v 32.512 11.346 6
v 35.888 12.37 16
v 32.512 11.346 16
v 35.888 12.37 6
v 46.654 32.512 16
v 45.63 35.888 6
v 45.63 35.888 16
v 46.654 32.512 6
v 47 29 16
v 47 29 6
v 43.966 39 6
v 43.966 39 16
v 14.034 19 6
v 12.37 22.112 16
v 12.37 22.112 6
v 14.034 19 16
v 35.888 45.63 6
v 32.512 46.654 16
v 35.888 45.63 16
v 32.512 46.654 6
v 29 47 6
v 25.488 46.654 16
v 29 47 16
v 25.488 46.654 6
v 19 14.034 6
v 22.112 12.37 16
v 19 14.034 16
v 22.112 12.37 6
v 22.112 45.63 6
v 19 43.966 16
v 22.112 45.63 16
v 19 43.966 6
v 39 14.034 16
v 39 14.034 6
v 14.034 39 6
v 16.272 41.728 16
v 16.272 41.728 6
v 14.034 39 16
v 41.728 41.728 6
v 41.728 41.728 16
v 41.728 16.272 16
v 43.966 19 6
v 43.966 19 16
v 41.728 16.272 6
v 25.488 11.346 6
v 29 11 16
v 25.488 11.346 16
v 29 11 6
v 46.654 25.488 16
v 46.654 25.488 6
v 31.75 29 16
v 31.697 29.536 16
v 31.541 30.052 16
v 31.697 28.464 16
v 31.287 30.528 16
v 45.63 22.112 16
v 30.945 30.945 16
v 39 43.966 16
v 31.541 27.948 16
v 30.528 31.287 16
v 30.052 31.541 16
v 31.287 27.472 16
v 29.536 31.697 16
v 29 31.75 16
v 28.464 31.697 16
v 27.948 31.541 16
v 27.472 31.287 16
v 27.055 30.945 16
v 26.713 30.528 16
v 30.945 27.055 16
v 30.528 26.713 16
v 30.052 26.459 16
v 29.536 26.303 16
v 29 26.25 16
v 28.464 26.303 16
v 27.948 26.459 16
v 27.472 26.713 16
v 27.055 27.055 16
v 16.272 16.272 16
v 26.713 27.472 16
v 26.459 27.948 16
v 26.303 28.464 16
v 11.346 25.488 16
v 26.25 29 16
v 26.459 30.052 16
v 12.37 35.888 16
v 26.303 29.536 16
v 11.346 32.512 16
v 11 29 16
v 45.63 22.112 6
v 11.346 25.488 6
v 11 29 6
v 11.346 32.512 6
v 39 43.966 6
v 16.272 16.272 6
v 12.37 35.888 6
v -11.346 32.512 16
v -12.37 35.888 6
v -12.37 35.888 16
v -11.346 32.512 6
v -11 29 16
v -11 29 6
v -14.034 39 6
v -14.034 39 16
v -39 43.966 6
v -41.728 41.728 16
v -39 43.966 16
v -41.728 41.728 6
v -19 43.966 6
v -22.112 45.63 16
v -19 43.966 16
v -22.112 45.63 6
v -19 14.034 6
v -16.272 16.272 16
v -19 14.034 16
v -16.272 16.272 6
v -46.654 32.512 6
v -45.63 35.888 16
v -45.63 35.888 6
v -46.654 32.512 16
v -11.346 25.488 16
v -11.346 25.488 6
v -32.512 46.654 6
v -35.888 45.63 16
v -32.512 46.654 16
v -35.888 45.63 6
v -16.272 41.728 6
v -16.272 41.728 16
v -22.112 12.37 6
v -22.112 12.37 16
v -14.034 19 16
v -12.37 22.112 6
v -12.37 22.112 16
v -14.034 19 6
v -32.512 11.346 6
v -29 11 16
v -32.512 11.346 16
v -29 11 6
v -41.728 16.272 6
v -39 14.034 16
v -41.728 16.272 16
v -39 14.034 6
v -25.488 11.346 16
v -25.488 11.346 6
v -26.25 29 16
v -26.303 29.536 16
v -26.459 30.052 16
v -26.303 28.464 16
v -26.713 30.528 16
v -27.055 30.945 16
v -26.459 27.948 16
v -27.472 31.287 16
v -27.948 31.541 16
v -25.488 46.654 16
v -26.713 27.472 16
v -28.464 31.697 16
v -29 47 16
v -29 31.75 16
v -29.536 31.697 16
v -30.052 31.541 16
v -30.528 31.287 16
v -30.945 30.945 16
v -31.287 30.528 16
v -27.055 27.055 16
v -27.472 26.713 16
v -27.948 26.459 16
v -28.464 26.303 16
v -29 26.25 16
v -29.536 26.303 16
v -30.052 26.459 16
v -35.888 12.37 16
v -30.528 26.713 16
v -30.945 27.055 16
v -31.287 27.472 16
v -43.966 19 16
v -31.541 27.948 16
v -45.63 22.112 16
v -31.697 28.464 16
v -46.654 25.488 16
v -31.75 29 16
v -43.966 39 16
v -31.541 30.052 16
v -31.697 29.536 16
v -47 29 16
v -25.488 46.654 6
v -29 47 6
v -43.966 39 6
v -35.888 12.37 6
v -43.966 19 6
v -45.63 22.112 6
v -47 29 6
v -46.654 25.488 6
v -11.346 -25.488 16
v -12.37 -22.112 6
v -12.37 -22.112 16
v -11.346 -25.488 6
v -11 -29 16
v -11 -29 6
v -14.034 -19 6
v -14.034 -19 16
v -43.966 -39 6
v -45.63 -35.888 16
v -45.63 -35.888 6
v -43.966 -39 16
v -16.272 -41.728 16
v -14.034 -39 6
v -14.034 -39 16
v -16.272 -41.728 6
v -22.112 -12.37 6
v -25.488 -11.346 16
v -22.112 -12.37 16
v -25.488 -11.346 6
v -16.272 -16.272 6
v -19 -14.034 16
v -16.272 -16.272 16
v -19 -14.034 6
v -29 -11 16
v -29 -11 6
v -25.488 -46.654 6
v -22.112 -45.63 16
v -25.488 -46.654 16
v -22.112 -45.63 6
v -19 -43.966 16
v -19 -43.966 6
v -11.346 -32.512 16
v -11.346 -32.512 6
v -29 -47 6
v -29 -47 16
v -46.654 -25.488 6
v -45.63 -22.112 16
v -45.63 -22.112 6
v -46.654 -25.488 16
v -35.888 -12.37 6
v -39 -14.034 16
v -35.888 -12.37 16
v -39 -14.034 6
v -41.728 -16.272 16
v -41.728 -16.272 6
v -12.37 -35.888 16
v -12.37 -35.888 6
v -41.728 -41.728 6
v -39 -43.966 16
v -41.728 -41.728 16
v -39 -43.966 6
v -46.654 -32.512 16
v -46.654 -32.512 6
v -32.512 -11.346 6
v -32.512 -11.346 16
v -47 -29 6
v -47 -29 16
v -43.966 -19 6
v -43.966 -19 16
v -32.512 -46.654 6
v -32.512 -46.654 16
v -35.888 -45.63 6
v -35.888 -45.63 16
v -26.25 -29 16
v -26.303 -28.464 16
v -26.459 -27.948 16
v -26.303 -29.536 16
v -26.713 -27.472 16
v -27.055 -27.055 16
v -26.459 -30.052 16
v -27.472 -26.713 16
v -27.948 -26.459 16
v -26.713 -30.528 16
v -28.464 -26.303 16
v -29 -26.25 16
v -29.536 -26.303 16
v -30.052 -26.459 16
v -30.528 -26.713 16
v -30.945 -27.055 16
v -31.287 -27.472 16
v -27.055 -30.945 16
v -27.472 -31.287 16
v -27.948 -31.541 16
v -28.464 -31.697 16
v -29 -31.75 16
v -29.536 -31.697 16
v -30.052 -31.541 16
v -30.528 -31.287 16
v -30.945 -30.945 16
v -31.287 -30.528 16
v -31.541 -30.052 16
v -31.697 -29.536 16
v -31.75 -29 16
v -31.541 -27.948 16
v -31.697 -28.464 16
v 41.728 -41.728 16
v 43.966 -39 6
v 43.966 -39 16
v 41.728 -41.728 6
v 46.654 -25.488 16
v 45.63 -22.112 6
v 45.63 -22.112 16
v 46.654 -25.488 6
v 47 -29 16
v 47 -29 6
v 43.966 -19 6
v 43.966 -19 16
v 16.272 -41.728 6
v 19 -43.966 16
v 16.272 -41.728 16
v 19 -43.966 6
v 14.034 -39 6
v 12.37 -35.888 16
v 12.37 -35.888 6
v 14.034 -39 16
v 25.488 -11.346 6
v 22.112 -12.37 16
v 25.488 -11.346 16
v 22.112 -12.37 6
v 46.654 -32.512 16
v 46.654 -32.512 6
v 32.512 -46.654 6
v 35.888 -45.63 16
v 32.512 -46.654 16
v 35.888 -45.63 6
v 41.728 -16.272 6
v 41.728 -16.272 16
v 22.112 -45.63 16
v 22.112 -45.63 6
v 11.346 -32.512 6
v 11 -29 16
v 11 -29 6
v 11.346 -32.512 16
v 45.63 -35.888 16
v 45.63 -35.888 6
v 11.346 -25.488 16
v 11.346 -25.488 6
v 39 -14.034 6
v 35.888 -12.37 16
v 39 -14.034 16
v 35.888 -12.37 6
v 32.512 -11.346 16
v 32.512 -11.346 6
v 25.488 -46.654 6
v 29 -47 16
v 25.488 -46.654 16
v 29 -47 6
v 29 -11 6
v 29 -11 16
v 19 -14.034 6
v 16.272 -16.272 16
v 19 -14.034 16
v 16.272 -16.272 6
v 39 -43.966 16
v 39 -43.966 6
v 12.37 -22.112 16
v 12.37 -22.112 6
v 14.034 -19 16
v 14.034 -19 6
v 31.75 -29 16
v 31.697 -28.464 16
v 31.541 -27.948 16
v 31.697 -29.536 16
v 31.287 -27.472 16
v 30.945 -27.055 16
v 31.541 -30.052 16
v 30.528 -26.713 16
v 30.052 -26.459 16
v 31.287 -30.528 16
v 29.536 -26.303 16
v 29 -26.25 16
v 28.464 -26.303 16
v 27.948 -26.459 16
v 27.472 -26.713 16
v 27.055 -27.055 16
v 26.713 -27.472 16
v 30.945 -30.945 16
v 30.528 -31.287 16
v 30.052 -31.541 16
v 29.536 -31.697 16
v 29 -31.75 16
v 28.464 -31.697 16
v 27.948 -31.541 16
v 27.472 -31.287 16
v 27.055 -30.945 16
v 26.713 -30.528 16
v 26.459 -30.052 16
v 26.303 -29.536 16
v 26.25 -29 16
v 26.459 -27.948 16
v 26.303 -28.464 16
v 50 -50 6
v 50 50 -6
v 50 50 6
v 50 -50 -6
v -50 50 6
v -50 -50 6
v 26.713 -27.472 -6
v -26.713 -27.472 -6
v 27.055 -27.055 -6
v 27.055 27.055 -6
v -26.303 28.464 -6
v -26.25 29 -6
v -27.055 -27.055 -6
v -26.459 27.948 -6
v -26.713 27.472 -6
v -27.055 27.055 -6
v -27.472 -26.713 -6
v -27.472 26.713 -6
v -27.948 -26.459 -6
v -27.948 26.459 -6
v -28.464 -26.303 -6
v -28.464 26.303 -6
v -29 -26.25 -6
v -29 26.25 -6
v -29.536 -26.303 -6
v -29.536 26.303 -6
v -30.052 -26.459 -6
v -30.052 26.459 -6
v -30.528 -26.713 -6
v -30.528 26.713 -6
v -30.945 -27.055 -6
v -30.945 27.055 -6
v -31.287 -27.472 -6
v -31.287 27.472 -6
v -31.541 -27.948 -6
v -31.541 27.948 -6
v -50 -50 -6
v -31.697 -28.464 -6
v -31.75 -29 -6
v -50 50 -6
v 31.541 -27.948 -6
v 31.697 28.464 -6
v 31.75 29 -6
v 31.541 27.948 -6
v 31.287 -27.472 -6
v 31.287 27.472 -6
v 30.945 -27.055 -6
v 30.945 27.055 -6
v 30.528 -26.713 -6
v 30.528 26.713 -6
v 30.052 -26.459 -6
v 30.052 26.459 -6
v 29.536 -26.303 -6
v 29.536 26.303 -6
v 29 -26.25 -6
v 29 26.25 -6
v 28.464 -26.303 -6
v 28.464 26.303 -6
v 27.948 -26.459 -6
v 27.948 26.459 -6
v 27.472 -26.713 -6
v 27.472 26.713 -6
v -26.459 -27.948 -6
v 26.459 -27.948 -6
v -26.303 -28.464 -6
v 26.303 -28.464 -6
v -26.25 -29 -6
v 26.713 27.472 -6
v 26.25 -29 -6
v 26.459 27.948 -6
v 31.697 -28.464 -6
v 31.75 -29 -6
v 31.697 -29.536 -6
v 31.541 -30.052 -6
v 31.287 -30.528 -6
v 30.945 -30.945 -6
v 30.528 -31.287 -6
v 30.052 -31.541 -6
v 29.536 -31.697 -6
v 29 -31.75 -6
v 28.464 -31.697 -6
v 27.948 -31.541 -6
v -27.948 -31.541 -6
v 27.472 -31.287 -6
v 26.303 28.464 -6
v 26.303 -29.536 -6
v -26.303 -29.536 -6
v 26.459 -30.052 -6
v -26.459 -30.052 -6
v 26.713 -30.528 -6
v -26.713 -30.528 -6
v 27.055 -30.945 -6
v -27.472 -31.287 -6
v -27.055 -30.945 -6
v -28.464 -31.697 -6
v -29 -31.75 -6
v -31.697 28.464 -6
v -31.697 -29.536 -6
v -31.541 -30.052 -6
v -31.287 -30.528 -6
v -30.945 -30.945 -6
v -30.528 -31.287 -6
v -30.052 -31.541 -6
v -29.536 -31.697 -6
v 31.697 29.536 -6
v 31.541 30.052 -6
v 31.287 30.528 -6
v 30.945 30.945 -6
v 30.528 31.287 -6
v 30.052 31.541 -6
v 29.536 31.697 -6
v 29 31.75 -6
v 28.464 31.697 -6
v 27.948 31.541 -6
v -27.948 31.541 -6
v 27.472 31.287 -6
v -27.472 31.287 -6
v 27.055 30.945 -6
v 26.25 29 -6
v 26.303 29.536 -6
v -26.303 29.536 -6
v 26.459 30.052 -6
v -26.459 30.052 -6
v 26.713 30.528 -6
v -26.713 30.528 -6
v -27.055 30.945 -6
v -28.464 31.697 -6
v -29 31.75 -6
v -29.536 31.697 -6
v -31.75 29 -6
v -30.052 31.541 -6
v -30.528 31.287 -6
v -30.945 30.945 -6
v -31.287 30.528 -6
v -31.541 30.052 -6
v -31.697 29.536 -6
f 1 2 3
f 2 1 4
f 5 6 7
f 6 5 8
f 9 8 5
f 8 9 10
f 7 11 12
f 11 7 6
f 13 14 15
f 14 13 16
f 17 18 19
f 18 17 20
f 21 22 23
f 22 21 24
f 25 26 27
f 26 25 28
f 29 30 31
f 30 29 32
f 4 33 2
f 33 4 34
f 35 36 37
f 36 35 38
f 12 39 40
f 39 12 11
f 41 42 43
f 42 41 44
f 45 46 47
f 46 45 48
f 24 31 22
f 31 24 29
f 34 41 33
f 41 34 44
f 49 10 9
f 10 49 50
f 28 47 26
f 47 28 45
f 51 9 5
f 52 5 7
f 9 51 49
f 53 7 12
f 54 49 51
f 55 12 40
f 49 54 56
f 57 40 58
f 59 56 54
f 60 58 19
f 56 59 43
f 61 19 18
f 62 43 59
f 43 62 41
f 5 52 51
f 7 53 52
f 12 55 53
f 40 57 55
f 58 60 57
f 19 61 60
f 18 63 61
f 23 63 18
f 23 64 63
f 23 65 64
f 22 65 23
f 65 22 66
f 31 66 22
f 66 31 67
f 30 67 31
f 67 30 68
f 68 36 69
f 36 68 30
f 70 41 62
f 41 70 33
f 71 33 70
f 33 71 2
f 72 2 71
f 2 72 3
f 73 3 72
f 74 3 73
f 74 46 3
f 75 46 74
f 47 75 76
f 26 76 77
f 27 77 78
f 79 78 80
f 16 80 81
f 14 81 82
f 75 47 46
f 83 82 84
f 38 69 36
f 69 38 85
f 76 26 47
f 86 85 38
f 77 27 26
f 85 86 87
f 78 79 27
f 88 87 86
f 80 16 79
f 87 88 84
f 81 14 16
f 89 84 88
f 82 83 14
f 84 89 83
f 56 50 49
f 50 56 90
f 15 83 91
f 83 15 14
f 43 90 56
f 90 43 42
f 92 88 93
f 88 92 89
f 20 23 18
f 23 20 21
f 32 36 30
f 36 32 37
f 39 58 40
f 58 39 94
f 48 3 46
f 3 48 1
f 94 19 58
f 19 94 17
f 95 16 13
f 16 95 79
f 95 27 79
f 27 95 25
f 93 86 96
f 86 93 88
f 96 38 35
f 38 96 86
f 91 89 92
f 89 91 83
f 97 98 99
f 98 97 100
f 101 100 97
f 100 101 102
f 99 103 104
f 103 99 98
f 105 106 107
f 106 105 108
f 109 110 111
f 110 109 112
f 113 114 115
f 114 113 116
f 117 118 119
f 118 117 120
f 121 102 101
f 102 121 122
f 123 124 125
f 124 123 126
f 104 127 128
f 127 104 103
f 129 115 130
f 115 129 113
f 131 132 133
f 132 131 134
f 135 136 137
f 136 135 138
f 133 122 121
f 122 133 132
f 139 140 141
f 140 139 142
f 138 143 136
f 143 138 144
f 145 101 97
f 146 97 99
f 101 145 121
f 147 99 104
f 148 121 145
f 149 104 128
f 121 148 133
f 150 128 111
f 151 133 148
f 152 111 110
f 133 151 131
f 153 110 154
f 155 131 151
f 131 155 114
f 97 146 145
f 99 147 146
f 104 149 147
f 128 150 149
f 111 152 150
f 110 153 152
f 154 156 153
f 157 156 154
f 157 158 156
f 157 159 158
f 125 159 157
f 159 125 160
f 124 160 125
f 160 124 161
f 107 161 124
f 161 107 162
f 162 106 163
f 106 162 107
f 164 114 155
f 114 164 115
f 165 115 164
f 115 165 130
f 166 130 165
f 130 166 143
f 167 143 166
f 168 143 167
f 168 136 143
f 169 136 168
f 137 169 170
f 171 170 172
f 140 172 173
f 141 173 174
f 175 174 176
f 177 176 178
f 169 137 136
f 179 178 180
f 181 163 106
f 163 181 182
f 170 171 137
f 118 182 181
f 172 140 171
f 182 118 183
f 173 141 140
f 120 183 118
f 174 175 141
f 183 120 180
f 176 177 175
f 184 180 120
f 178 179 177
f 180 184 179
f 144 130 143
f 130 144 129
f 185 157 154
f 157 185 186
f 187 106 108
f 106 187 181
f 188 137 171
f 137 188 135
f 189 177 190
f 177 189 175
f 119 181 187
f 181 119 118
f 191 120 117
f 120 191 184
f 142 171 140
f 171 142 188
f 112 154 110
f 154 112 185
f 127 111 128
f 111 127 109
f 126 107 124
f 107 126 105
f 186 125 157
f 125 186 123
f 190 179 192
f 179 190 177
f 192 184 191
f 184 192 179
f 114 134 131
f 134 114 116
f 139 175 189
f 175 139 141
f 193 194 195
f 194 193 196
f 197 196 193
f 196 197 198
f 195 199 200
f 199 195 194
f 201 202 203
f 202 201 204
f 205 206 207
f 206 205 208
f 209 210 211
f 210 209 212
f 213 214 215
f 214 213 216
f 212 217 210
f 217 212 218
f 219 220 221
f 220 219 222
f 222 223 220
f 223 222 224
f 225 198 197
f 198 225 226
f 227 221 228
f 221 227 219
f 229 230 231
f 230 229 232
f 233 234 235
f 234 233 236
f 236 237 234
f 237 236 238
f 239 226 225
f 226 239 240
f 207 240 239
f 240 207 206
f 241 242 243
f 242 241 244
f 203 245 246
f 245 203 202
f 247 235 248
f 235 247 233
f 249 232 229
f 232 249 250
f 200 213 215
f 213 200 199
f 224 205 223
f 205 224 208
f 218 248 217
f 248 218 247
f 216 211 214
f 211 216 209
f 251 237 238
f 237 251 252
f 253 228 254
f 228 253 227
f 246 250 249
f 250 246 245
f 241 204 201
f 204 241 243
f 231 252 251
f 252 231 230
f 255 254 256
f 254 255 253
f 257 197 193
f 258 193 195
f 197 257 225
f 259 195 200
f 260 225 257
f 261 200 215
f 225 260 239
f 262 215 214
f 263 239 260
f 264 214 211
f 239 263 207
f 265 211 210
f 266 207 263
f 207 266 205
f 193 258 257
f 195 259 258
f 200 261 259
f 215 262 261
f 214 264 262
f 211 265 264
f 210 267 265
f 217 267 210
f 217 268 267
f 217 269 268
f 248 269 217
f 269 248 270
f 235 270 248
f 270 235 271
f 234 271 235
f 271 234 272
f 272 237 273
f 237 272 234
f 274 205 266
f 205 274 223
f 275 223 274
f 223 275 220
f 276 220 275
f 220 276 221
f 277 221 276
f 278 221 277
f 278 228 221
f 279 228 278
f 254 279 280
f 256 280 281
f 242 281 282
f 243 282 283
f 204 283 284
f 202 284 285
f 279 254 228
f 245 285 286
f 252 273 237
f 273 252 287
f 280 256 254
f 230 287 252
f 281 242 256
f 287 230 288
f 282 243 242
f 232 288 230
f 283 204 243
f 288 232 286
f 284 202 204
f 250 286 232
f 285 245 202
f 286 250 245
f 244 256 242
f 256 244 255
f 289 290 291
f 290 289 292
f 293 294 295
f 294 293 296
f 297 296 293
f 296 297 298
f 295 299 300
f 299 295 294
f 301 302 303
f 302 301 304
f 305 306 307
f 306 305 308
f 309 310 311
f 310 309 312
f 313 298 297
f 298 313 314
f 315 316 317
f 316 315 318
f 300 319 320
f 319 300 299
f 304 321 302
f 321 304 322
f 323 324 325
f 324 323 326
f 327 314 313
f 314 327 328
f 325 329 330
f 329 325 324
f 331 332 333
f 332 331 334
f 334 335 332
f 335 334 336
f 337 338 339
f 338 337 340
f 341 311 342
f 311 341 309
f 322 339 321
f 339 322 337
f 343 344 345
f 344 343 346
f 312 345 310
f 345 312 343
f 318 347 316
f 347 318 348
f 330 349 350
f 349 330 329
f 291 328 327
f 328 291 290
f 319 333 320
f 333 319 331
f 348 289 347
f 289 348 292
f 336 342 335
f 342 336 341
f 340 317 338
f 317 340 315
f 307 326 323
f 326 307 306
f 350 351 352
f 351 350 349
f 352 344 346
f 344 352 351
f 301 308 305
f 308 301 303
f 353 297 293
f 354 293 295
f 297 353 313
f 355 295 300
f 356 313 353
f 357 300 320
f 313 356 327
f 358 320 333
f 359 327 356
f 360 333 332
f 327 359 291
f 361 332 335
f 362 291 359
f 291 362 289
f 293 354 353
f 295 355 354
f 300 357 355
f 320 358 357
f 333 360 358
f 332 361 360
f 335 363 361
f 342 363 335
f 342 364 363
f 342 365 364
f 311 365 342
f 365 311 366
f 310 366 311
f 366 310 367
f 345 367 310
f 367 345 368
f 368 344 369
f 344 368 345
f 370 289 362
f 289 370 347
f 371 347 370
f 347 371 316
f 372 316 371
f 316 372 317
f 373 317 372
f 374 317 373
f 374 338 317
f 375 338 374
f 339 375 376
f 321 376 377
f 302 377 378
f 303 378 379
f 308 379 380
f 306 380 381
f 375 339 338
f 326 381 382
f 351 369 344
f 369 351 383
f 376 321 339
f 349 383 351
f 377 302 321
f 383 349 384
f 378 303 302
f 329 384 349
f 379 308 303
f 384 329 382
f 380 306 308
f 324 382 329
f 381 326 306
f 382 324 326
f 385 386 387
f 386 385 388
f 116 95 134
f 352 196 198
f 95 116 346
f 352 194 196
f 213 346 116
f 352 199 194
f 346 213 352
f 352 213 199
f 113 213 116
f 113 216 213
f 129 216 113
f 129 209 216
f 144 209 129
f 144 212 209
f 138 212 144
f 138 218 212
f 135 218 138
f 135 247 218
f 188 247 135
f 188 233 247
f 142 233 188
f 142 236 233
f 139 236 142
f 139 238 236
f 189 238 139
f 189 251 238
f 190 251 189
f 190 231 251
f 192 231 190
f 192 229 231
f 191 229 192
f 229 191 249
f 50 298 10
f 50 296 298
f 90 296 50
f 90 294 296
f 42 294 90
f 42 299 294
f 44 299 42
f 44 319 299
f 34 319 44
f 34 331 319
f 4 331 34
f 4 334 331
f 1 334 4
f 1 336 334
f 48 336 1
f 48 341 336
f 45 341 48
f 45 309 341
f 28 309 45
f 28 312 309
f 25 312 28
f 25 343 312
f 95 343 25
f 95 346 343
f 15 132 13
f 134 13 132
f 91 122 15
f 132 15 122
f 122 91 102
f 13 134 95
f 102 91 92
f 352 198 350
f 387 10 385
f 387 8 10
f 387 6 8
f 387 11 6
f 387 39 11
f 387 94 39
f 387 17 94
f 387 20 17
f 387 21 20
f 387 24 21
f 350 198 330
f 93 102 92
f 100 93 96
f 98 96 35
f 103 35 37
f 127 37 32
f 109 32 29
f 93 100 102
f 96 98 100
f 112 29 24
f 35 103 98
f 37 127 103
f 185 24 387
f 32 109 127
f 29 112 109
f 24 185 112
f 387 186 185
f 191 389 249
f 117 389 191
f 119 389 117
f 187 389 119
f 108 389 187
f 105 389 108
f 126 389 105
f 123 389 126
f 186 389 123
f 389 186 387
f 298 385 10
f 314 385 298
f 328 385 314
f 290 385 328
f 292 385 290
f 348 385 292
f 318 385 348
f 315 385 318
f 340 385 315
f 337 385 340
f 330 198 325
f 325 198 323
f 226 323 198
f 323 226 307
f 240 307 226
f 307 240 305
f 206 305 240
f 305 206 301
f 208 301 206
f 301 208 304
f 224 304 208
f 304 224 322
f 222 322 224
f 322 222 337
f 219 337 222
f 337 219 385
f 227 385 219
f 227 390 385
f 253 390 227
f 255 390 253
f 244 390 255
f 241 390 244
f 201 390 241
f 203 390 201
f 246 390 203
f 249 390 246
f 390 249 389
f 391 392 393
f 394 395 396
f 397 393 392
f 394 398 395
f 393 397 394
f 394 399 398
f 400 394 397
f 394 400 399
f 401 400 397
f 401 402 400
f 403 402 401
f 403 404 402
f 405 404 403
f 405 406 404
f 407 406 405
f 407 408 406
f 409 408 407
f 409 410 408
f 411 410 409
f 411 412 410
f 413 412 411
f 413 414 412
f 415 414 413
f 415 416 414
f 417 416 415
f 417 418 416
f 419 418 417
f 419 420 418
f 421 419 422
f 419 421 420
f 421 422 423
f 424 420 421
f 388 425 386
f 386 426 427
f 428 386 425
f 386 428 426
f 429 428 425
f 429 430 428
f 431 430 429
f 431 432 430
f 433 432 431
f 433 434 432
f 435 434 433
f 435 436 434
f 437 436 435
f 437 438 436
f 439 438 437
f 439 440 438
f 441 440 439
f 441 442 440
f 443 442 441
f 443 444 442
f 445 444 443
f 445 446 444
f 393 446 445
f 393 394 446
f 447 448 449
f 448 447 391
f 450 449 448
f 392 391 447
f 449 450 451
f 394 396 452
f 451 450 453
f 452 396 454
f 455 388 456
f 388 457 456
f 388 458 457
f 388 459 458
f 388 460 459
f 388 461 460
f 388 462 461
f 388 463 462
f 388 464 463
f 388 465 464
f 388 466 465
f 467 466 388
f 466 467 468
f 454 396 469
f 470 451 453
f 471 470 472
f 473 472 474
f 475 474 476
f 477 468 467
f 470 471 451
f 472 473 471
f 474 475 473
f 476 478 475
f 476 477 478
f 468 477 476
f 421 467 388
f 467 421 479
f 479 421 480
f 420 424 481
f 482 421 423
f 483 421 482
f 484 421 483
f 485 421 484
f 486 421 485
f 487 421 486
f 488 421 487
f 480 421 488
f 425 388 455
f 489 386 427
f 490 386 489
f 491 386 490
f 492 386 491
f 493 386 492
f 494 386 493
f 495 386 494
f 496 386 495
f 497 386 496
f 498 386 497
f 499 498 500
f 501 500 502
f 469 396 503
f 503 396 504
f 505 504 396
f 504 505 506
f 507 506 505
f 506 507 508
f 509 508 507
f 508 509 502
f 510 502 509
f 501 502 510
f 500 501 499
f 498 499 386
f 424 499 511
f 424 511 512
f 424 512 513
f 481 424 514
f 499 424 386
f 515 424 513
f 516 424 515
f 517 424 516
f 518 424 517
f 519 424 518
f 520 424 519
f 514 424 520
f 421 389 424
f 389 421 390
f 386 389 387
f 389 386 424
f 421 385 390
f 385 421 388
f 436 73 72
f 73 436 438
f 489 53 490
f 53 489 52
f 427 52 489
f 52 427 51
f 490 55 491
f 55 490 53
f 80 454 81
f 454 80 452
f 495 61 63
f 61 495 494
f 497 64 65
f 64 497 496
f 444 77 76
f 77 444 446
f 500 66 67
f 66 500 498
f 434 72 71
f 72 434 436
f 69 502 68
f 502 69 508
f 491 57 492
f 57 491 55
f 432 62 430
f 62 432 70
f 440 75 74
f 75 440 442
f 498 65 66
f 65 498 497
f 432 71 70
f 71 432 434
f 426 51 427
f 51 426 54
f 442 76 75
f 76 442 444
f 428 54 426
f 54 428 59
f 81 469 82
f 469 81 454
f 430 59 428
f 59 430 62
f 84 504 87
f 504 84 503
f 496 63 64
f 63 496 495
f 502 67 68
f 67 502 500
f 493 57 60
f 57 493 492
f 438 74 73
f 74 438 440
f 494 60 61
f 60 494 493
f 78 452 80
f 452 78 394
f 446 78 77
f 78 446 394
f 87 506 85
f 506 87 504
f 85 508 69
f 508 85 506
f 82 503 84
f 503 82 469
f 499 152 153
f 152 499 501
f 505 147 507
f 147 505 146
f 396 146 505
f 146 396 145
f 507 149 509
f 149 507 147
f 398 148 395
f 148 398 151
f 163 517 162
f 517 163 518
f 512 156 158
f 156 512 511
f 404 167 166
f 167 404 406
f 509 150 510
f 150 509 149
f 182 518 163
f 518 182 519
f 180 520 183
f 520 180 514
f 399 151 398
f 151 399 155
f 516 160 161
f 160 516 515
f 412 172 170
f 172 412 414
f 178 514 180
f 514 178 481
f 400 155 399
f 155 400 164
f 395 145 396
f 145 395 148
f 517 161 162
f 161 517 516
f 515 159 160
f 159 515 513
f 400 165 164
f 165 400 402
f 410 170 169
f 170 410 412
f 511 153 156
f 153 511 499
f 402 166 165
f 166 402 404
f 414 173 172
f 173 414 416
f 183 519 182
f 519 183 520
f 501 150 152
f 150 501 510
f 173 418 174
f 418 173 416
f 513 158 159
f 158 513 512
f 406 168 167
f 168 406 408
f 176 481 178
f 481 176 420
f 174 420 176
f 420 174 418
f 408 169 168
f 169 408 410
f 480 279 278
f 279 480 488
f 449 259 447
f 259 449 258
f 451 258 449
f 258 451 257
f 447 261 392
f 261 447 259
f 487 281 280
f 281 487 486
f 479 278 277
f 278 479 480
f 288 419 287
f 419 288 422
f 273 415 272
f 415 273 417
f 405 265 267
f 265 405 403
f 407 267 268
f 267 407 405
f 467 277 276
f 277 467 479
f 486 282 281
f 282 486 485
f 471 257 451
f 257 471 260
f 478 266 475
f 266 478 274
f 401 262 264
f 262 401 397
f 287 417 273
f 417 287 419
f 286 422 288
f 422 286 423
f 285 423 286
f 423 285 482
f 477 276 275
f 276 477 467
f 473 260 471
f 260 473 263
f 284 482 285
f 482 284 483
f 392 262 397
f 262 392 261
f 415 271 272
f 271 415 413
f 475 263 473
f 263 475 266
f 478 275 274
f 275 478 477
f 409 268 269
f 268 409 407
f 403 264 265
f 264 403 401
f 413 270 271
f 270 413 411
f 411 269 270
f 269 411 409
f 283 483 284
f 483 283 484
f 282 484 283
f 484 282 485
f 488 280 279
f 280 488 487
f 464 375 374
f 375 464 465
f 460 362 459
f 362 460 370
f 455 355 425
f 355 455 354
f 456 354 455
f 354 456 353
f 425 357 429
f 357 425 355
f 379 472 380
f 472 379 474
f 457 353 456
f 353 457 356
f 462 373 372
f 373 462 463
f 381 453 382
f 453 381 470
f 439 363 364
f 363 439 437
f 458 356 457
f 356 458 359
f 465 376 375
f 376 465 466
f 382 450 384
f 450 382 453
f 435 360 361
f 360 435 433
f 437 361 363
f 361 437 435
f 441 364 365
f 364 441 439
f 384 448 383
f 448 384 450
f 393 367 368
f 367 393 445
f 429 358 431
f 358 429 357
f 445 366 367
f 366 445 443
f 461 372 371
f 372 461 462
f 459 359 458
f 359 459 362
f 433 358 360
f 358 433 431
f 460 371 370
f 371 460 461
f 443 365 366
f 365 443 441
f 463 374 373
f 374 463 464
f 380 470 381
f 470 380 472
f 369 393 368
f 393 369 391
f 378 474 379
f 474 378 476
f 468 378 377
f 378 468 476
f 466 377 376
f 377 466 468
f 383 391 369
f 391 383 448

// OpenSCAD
$fn = 32;

// ----------------------------------------------------------------------
// Anchor pads 100 x 100 x 22
// four corner bosses with anchor holes
// ----------------------------------------------------------------------

// --- parameters (mm) ---
plate = [100, 100, 12];  // base plate size (x, y, z)
pads = 4;                // boss count, one per corner
edge = 21;               // boss centre offset from the plate edge
boss_d = 36;             // boss diameter
boss_h = 10;             // boss height above the base plate
hole_d = 5.5;            // hole diameter

// --- derived feature positions (mm) ---
height = plate[2] + boss_h;      // = 22   overall height of the part
corner_x = plate[0] / 2 - edge;  // = 29   boss centre X
corner_y = plate[1] / 2 - edge;  // = 29   boss centre Y
feature_centers = [
  [corner_x, corner_y],
  [-corner_x, corner_y],
  [-corner_x, -corner_y],
  [corner_x, -corner_y]
];   // boss centres, anchor holes are drilled there

// base plate, four bosses standing on it, anchor holes all the way through
difference() {
  union() {
    cube(plate, center = true);
    for (centre = feature_centers)
      translate([centre[0], centre[1], plate[2] / 2 - 1])
        cylinder(d = boss_d, h = boss_h + 1);
  }
  for (centre = feature_centers)
    translate([centre[0], centre[1], -height])
      cylinder(d = hole_d, h = 2 * height + 2);  // through boss and plate
}
